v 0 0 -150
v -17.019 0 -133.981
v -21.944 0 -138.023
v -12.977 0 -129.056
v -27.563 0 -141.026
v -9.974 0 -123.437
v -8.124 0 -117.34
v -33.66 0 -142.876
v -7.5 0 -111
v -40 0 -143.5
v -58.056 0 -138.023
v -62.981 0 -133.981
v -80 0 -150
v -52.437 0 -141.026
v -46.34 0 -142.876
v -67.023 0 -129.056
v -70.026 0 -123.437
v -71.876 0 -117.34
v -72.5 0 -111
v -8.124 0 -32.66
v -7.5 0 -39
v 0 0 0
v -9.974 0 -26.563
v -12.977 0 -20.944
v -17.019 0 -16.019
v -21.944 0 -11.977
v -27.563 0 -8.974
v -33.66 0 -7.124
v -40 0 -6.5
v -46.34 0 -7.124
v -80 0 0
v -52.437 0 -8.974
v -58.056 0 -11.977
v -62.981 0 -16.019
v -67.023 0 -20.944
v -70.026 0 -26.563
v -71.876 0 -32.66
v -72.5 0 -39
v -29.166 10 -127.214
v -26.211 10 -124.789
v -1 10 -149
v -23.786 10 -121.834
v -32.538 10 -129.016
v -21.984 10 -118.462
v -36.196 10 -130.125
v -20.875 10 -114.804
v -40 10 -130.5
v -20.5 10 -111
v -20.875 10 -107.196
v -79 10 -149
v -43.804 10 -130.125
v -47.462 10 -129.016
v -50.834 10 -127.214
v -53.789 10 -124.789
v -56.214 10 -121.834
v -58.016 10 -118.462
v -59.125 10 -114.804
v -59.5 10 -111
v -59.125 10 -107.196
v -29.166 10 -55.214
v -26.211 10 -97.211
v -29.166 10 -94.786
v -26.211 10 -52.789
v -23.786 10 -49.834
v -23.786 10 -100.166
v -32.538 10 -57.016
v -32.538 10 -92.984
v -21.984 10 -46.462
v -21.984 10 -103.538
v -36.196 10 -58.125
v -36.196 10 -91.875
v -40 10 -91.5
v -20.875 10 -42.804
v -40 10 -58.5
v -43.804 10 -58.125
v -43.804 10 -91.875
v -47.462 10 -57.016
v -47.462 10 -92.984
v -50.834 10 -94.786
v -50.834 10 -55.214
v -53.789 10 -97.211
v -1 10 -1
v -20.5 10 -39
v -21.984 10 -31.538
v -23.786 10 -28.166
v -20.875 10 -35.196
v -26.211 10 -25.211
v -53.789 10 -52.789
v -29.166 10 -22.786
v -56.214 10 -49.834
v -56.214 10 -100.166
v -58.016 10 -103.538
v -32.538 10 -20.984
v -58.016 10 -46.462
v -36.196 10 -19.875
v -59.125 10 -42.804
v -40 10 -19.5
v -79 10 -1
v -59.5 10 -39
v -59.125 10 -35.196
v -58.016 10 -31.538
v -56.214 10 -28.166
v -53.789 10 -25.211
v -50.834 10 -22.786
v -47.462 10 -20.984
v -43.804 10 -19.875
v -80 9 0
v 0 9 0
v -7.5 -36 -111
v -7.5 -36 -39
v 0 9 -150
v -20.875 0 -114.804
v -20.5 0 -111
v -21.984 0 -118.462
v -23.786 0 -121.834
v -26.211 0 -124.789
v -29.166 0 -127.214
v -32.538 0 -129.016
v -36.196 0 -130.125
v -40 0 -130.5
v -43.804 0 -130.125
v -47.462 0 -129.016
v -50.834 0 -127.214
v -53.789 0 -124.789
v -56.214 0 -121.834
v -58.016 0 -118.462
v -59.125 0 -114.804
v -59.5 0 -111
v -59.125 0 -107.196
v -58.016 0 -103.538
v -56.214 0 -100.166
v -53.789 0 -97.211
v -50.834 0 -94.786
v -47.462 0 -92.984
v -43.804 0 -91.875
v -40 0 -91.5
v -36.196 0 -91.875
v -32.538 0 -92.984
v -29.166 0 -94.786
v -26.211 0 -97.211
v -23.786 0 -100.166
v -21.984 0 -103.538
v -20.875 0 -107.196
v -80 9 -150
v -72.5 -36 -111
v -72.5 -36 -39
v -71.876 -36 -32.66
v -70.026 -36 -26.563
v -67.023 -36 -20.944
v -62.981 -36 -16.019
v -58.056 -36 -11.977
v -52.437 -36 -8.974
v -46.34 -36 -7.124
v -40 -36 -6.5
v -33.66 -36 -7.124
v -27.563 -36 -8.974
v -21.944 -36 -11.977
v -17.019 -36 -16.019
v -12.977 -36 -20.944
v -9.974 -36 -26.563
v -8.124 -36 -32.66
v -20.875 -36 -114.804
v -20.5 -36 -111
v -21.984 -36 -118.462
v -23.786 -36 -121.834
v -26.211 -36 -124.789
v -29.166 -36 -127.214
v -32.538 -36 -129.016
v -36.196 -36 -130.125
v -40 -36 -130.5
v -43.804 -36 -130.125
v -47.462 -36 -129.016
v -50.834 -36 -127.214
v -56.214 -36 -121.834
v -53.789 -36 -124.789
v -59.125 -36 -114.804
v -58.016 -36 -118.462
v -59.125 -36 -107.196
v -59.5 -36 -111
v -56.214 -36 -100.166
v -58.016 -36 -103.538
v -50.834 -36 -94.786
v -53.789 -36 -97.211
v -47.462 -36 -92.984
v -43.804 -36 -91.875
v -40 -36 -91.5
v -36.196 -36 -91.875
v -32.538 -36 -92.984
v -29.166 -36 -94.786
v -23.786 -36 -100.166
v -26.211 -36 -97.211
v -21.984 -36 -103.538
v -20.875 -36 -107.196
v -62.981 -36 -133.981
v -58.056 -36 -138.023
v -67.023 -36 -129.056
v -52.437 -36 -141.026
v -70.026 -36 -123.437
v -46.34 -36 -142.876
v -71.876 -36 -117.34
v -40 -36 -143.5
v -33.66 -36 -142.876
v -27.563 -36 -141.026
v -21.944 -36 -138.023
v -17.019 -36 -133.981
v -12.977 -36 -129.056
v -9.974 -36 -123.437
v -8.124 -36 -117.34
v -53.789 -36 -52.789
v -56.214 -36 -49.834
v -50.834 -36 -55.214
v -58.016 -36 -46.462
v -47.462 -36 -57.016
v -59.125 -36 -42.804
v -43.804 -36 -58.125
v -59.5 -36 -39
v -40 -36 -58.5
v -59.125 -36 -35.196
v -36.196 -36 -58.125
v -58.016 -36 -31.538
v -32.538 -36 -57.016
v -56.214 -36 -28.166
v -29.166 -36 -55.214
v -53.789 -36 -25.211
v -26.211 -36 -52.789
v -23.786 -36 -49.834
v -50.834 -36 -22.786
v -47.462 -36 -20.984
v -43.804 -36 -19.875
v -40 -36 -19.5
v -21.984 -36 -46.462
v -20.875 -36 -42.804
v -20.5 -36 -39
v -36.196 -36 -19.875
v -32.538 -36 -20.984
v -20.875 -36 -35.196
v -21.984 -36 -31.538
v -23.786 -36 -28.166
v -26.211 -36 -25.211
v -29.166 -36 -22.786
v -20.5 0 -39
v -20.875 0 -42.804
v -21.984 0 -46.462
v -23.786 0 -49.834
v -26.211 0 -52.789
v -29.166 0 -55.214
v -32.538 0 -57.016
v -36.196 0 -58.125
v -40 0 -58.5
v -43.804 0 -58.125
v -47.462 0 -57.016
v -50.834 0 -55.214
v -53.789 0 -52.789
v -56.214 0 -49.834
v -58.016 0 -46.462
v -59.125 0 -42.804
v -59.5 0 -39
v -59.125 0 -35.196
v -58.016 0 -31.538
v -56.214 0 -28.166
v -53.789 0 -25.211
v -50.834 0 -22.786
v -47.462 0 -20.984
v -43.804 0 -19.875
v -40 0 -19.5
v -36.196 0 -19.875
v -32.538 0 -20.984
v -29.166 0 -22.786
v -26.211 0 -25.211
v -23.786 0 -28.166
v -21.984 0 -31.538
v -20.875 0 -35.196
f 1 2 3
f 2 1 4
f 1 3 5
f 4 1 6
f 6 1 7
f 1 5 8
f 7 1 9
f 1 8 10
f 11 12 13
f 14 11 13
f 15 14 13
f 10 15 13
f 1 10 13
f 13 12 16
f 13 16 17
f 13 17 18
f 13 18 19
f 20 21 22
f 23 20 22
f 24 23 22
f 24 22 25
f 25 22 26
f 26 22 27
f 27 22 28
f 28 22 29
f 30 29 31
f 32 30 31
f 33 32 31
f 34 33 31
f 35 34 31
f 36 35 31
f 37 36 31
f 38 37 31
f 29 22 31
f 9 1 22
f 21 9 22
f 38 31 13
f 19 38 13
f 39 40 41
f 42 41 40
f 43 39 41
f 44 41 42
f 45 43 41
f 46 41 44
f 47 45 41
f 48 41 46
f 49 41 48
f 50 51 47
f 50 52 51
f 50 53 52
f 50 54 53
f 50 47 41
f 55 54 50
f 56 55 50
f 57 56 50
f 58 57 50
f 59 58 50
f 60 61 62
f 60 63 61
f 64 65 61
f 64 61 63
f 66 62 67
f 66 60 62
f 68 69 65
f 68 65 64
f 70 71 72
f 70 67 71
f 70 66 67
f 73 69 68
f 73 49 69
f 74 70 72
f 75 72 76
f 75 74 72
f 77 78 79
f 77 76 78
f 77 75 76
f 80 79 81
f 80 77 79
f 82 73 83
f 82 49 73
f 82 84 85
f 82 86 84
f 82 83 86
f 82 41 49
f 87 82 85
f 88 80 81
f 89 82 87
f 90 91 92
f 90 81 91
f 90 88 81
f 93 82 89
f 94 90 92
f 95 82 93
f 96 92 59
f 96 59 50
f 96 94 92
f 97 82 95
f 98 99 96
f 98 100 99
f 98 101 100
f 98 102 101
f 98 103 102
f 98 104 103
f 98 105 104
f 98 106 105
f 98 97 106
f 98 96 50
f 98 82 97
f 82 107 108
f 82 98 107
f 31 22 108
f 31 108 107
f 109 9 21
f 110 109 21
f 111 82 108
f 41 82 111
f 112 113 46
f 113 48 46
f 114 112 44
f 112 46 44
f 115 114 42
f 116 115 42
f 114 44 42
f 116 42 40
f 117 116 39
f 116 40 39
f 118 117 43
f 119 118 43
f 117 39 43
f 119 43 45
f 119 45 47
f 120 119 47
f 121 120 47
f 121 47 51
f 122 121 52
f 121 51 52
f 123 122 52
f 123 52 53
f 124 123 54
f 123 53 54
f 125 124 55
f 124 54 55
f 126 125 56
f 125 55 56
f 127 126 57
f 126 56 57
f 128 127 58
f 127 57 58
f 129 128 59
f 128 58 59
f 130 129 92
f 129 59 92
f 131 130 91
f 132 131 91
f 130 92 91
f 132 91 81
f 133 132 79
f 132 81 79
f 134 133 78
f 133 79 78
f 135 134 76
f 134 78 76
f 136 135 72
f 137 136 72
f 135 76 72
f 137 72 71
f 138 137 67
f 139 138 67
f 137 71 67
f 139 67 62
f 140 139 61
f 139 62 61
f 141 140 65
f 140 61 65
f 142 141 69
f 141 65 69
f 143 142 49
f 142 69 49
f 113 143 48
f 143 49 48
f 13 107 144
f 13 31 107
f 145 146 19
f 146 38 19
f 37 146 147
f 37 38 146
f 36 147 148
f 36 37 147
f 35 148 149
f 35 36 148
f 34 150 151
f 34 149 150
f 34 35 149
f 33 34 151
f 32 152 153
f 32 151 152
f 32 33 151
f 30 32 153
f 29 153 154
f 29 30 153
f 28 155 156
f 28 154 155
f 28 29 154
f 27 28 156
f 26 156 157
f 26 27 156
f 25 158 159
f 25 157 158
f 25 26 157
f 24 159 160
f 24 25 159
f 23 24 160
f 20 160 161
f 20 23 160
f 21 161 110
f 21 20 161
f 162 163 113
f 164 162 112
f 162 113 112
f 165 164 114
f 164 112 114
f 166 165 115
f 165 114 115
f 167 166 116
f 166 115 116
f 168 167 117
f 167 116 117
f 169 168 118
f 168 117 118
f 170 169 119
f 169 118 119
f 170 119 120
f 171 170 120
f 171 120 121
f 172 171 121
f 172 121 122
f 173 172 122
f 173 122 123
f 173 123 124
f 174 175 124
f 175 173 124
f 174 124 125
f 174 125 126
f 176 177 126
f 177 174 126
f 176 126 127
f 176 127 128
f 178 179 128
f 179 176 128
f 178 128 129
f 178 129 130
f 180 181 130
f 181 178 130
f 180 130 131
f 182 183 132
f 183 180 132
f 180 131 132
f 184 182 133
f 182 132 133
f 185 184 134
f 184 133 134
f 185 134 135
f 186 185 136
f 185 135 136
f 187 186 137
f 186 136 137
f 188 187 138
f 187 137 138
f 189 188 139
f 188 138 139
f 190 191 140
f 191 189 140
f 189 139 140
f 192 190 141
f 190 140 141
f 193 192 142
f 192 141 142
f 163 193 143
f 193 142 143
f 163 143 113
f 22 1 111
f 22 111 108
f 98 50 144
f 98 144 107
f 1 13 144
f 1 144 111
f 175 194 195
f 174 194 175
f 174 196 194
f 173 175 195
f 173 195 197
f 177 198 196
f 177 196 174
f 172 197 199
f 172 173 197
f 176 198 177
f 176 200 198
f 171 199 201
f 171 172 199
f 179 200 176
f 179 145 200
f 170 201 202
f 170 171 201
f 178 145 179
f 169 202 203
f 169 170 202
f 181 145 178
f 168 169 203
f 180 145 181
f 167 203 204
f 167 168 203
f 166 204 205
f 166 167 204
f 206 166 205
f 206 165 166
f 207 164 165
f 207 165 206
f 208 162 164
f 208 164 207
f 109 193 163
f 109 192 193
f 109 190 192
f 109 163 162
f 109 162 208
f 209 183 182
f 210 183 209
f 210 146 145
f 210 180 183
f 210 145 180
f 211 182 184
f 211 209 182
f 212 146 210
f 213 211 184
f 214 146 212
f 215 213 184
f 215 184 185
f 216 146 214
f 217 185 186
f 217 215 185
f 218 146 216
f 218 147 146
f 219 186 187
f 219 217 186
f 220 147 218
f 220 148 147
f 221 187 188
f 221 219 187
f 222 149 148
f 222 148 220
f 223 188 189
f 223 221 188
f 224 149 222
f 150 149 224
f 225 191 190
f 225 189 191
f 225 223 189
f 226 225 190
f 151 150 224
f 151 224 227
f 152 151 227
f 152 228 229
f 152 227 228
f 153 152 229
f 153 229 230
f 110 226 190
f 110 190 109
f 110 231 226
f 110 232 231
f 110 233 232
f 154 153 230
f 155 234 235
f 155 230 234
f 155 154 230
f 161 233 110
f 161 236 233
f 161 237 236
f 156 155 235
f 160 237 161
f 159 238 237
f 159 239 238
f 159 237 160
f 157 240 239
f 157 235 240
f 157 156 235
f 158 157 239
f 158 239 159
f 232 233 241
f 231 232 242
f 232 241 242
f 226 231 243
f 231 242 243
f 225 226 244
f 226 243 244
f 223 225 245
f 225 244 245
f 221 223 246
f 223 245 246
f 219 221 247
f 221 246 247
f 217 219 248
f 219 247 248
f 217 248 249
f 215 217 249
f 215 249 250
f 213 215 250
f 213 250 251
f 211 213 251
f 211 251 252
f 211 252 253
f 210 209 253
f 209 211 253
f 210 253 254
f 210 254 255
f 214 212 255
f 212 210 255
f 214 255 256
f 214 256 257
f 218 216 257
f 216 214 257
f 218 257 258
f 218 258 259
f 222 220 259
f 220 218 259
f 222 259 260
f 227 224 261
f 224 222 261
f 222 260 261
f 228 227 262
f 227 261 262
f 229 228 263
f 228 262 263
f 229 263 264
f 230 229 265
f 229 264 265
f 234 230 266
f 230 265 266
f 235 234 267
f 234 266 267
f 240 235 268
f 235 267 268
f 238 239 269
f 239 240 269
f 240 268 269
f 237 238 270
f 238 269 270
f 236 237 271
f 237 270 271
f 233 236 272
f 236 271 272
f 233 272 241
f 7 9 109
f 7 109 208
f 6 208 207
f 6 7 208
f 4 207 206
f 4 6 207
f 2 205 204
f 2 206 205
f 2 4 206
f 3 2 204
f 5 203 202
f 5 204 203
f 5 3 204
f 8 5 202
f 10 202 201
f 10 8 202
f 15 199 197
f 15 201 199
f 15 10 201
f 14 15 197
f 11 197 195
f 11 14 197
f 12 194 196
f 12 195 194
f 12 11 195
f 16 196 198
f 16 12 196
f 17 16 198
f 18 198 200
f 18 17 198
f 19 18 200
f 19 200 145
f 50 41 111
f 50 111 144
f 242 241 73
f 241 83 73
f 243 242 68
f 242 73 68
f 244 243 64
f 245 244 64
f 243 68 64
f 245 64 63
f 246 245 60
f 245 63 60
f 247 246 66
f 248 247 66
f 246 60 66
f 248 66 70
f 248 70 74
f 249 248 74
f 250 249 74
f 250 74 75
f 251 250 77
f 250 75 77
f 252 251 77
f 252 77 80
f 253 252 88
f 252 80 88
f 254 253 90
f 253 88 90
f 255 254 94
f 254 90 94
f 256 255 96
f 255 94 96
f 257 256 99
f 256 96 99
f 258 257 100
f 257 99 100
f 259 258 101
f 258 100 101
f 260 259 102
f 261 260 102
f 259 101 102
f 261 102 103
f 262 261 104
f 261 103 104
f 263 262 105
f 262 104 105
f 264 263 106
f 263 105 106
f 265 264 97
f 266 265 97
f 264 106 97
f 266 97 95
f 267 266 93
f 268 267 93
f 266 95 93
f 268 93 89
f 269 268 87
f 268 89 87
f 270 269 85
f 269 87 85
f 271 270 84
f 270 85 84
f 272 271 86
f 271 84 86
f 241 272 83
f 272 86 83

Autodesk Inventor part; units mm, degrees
ref_plane "YZ Plane" through (0, 0, 0) normal (1, 0, 0) x (0, 1, 0)
ref_plane "XZ Plane" through (0, 0, 0) normal (0, 1, 0) x (-1, 0, 0)
ref_plane "XY Plane" through (0, 0, 0) normal (0, 0, 1) x (1, 0, 0)
sketch "Skizze1" plane through (0, 0, 0) normal (0, 1, 0) x (-1, 0, 0)
  line L0 (0, 0) -> (80, 0)
  line L1 (80, 0) -> (80, -150)
  line L2 (80, -150) -> (0, -150)
  line L3 (0, -150) -> (0, 0)
  dimension "d0" = 80
  dimension "d1" = 150
extrude "Extrusion1" add sketch "Skizze1" along normal blind 10
sketch "Skizze2" plane through (0, 10, 0) normal (0, 1, 0) x (1, 0, 0)
  circle A0 centre (-40, 39) radius 19.5
  line L0 (-80, 0) -> (0, 0) projected
  line L1 (0, 150) -> (-80, 150) projected
  line L2 (-80, 150) -> (-80, 0) projected
  line L3 (-80, 75) -> (0, 75)
  circle A1 centre (-40, 111) radius 19.5
  dimension "d4" = 39
  dimension "d5" = 72
extrude "Extrusion2" cut sketch "Skizze2" against normal blind 10
sketch "Skizze3" plane through (0, 0, 0) normal (0, -1, 0) x (1, 0, 0)
  circle A0 centre (-40, -111) radius 19.5 projected
  circle A1 centre (-40, -39) radius 19.5 projected
  line L0 (-40, -111) -> (-40, -39) construction
  line L1 (-7.5, -111) -> (-7.5, -39)
  line L2 (-72.5, -39) -> (-72.5, -111)
  arc A2 (-72.5, -111) -> (-7.5, -111) centre (-40, -111) ccw
  arc A3 (-7.5, -39) -> (-72.5, -39) centre (-40, -39) ccw
  point P0 (0, 0)
  point P1 (-40, -75)
  dimension "d8" = 65
extrude "Extrusion3" add sketch "Skizze3" along normal blind 36
chamfer "Fasen1" distance 1 angle 45 4 edges at (-80, 10, -75) (-40, 10, -150) (0, 10, -75) (-40, 10, 0)
properties part number "Double_Steckdose" material "Gummi"
